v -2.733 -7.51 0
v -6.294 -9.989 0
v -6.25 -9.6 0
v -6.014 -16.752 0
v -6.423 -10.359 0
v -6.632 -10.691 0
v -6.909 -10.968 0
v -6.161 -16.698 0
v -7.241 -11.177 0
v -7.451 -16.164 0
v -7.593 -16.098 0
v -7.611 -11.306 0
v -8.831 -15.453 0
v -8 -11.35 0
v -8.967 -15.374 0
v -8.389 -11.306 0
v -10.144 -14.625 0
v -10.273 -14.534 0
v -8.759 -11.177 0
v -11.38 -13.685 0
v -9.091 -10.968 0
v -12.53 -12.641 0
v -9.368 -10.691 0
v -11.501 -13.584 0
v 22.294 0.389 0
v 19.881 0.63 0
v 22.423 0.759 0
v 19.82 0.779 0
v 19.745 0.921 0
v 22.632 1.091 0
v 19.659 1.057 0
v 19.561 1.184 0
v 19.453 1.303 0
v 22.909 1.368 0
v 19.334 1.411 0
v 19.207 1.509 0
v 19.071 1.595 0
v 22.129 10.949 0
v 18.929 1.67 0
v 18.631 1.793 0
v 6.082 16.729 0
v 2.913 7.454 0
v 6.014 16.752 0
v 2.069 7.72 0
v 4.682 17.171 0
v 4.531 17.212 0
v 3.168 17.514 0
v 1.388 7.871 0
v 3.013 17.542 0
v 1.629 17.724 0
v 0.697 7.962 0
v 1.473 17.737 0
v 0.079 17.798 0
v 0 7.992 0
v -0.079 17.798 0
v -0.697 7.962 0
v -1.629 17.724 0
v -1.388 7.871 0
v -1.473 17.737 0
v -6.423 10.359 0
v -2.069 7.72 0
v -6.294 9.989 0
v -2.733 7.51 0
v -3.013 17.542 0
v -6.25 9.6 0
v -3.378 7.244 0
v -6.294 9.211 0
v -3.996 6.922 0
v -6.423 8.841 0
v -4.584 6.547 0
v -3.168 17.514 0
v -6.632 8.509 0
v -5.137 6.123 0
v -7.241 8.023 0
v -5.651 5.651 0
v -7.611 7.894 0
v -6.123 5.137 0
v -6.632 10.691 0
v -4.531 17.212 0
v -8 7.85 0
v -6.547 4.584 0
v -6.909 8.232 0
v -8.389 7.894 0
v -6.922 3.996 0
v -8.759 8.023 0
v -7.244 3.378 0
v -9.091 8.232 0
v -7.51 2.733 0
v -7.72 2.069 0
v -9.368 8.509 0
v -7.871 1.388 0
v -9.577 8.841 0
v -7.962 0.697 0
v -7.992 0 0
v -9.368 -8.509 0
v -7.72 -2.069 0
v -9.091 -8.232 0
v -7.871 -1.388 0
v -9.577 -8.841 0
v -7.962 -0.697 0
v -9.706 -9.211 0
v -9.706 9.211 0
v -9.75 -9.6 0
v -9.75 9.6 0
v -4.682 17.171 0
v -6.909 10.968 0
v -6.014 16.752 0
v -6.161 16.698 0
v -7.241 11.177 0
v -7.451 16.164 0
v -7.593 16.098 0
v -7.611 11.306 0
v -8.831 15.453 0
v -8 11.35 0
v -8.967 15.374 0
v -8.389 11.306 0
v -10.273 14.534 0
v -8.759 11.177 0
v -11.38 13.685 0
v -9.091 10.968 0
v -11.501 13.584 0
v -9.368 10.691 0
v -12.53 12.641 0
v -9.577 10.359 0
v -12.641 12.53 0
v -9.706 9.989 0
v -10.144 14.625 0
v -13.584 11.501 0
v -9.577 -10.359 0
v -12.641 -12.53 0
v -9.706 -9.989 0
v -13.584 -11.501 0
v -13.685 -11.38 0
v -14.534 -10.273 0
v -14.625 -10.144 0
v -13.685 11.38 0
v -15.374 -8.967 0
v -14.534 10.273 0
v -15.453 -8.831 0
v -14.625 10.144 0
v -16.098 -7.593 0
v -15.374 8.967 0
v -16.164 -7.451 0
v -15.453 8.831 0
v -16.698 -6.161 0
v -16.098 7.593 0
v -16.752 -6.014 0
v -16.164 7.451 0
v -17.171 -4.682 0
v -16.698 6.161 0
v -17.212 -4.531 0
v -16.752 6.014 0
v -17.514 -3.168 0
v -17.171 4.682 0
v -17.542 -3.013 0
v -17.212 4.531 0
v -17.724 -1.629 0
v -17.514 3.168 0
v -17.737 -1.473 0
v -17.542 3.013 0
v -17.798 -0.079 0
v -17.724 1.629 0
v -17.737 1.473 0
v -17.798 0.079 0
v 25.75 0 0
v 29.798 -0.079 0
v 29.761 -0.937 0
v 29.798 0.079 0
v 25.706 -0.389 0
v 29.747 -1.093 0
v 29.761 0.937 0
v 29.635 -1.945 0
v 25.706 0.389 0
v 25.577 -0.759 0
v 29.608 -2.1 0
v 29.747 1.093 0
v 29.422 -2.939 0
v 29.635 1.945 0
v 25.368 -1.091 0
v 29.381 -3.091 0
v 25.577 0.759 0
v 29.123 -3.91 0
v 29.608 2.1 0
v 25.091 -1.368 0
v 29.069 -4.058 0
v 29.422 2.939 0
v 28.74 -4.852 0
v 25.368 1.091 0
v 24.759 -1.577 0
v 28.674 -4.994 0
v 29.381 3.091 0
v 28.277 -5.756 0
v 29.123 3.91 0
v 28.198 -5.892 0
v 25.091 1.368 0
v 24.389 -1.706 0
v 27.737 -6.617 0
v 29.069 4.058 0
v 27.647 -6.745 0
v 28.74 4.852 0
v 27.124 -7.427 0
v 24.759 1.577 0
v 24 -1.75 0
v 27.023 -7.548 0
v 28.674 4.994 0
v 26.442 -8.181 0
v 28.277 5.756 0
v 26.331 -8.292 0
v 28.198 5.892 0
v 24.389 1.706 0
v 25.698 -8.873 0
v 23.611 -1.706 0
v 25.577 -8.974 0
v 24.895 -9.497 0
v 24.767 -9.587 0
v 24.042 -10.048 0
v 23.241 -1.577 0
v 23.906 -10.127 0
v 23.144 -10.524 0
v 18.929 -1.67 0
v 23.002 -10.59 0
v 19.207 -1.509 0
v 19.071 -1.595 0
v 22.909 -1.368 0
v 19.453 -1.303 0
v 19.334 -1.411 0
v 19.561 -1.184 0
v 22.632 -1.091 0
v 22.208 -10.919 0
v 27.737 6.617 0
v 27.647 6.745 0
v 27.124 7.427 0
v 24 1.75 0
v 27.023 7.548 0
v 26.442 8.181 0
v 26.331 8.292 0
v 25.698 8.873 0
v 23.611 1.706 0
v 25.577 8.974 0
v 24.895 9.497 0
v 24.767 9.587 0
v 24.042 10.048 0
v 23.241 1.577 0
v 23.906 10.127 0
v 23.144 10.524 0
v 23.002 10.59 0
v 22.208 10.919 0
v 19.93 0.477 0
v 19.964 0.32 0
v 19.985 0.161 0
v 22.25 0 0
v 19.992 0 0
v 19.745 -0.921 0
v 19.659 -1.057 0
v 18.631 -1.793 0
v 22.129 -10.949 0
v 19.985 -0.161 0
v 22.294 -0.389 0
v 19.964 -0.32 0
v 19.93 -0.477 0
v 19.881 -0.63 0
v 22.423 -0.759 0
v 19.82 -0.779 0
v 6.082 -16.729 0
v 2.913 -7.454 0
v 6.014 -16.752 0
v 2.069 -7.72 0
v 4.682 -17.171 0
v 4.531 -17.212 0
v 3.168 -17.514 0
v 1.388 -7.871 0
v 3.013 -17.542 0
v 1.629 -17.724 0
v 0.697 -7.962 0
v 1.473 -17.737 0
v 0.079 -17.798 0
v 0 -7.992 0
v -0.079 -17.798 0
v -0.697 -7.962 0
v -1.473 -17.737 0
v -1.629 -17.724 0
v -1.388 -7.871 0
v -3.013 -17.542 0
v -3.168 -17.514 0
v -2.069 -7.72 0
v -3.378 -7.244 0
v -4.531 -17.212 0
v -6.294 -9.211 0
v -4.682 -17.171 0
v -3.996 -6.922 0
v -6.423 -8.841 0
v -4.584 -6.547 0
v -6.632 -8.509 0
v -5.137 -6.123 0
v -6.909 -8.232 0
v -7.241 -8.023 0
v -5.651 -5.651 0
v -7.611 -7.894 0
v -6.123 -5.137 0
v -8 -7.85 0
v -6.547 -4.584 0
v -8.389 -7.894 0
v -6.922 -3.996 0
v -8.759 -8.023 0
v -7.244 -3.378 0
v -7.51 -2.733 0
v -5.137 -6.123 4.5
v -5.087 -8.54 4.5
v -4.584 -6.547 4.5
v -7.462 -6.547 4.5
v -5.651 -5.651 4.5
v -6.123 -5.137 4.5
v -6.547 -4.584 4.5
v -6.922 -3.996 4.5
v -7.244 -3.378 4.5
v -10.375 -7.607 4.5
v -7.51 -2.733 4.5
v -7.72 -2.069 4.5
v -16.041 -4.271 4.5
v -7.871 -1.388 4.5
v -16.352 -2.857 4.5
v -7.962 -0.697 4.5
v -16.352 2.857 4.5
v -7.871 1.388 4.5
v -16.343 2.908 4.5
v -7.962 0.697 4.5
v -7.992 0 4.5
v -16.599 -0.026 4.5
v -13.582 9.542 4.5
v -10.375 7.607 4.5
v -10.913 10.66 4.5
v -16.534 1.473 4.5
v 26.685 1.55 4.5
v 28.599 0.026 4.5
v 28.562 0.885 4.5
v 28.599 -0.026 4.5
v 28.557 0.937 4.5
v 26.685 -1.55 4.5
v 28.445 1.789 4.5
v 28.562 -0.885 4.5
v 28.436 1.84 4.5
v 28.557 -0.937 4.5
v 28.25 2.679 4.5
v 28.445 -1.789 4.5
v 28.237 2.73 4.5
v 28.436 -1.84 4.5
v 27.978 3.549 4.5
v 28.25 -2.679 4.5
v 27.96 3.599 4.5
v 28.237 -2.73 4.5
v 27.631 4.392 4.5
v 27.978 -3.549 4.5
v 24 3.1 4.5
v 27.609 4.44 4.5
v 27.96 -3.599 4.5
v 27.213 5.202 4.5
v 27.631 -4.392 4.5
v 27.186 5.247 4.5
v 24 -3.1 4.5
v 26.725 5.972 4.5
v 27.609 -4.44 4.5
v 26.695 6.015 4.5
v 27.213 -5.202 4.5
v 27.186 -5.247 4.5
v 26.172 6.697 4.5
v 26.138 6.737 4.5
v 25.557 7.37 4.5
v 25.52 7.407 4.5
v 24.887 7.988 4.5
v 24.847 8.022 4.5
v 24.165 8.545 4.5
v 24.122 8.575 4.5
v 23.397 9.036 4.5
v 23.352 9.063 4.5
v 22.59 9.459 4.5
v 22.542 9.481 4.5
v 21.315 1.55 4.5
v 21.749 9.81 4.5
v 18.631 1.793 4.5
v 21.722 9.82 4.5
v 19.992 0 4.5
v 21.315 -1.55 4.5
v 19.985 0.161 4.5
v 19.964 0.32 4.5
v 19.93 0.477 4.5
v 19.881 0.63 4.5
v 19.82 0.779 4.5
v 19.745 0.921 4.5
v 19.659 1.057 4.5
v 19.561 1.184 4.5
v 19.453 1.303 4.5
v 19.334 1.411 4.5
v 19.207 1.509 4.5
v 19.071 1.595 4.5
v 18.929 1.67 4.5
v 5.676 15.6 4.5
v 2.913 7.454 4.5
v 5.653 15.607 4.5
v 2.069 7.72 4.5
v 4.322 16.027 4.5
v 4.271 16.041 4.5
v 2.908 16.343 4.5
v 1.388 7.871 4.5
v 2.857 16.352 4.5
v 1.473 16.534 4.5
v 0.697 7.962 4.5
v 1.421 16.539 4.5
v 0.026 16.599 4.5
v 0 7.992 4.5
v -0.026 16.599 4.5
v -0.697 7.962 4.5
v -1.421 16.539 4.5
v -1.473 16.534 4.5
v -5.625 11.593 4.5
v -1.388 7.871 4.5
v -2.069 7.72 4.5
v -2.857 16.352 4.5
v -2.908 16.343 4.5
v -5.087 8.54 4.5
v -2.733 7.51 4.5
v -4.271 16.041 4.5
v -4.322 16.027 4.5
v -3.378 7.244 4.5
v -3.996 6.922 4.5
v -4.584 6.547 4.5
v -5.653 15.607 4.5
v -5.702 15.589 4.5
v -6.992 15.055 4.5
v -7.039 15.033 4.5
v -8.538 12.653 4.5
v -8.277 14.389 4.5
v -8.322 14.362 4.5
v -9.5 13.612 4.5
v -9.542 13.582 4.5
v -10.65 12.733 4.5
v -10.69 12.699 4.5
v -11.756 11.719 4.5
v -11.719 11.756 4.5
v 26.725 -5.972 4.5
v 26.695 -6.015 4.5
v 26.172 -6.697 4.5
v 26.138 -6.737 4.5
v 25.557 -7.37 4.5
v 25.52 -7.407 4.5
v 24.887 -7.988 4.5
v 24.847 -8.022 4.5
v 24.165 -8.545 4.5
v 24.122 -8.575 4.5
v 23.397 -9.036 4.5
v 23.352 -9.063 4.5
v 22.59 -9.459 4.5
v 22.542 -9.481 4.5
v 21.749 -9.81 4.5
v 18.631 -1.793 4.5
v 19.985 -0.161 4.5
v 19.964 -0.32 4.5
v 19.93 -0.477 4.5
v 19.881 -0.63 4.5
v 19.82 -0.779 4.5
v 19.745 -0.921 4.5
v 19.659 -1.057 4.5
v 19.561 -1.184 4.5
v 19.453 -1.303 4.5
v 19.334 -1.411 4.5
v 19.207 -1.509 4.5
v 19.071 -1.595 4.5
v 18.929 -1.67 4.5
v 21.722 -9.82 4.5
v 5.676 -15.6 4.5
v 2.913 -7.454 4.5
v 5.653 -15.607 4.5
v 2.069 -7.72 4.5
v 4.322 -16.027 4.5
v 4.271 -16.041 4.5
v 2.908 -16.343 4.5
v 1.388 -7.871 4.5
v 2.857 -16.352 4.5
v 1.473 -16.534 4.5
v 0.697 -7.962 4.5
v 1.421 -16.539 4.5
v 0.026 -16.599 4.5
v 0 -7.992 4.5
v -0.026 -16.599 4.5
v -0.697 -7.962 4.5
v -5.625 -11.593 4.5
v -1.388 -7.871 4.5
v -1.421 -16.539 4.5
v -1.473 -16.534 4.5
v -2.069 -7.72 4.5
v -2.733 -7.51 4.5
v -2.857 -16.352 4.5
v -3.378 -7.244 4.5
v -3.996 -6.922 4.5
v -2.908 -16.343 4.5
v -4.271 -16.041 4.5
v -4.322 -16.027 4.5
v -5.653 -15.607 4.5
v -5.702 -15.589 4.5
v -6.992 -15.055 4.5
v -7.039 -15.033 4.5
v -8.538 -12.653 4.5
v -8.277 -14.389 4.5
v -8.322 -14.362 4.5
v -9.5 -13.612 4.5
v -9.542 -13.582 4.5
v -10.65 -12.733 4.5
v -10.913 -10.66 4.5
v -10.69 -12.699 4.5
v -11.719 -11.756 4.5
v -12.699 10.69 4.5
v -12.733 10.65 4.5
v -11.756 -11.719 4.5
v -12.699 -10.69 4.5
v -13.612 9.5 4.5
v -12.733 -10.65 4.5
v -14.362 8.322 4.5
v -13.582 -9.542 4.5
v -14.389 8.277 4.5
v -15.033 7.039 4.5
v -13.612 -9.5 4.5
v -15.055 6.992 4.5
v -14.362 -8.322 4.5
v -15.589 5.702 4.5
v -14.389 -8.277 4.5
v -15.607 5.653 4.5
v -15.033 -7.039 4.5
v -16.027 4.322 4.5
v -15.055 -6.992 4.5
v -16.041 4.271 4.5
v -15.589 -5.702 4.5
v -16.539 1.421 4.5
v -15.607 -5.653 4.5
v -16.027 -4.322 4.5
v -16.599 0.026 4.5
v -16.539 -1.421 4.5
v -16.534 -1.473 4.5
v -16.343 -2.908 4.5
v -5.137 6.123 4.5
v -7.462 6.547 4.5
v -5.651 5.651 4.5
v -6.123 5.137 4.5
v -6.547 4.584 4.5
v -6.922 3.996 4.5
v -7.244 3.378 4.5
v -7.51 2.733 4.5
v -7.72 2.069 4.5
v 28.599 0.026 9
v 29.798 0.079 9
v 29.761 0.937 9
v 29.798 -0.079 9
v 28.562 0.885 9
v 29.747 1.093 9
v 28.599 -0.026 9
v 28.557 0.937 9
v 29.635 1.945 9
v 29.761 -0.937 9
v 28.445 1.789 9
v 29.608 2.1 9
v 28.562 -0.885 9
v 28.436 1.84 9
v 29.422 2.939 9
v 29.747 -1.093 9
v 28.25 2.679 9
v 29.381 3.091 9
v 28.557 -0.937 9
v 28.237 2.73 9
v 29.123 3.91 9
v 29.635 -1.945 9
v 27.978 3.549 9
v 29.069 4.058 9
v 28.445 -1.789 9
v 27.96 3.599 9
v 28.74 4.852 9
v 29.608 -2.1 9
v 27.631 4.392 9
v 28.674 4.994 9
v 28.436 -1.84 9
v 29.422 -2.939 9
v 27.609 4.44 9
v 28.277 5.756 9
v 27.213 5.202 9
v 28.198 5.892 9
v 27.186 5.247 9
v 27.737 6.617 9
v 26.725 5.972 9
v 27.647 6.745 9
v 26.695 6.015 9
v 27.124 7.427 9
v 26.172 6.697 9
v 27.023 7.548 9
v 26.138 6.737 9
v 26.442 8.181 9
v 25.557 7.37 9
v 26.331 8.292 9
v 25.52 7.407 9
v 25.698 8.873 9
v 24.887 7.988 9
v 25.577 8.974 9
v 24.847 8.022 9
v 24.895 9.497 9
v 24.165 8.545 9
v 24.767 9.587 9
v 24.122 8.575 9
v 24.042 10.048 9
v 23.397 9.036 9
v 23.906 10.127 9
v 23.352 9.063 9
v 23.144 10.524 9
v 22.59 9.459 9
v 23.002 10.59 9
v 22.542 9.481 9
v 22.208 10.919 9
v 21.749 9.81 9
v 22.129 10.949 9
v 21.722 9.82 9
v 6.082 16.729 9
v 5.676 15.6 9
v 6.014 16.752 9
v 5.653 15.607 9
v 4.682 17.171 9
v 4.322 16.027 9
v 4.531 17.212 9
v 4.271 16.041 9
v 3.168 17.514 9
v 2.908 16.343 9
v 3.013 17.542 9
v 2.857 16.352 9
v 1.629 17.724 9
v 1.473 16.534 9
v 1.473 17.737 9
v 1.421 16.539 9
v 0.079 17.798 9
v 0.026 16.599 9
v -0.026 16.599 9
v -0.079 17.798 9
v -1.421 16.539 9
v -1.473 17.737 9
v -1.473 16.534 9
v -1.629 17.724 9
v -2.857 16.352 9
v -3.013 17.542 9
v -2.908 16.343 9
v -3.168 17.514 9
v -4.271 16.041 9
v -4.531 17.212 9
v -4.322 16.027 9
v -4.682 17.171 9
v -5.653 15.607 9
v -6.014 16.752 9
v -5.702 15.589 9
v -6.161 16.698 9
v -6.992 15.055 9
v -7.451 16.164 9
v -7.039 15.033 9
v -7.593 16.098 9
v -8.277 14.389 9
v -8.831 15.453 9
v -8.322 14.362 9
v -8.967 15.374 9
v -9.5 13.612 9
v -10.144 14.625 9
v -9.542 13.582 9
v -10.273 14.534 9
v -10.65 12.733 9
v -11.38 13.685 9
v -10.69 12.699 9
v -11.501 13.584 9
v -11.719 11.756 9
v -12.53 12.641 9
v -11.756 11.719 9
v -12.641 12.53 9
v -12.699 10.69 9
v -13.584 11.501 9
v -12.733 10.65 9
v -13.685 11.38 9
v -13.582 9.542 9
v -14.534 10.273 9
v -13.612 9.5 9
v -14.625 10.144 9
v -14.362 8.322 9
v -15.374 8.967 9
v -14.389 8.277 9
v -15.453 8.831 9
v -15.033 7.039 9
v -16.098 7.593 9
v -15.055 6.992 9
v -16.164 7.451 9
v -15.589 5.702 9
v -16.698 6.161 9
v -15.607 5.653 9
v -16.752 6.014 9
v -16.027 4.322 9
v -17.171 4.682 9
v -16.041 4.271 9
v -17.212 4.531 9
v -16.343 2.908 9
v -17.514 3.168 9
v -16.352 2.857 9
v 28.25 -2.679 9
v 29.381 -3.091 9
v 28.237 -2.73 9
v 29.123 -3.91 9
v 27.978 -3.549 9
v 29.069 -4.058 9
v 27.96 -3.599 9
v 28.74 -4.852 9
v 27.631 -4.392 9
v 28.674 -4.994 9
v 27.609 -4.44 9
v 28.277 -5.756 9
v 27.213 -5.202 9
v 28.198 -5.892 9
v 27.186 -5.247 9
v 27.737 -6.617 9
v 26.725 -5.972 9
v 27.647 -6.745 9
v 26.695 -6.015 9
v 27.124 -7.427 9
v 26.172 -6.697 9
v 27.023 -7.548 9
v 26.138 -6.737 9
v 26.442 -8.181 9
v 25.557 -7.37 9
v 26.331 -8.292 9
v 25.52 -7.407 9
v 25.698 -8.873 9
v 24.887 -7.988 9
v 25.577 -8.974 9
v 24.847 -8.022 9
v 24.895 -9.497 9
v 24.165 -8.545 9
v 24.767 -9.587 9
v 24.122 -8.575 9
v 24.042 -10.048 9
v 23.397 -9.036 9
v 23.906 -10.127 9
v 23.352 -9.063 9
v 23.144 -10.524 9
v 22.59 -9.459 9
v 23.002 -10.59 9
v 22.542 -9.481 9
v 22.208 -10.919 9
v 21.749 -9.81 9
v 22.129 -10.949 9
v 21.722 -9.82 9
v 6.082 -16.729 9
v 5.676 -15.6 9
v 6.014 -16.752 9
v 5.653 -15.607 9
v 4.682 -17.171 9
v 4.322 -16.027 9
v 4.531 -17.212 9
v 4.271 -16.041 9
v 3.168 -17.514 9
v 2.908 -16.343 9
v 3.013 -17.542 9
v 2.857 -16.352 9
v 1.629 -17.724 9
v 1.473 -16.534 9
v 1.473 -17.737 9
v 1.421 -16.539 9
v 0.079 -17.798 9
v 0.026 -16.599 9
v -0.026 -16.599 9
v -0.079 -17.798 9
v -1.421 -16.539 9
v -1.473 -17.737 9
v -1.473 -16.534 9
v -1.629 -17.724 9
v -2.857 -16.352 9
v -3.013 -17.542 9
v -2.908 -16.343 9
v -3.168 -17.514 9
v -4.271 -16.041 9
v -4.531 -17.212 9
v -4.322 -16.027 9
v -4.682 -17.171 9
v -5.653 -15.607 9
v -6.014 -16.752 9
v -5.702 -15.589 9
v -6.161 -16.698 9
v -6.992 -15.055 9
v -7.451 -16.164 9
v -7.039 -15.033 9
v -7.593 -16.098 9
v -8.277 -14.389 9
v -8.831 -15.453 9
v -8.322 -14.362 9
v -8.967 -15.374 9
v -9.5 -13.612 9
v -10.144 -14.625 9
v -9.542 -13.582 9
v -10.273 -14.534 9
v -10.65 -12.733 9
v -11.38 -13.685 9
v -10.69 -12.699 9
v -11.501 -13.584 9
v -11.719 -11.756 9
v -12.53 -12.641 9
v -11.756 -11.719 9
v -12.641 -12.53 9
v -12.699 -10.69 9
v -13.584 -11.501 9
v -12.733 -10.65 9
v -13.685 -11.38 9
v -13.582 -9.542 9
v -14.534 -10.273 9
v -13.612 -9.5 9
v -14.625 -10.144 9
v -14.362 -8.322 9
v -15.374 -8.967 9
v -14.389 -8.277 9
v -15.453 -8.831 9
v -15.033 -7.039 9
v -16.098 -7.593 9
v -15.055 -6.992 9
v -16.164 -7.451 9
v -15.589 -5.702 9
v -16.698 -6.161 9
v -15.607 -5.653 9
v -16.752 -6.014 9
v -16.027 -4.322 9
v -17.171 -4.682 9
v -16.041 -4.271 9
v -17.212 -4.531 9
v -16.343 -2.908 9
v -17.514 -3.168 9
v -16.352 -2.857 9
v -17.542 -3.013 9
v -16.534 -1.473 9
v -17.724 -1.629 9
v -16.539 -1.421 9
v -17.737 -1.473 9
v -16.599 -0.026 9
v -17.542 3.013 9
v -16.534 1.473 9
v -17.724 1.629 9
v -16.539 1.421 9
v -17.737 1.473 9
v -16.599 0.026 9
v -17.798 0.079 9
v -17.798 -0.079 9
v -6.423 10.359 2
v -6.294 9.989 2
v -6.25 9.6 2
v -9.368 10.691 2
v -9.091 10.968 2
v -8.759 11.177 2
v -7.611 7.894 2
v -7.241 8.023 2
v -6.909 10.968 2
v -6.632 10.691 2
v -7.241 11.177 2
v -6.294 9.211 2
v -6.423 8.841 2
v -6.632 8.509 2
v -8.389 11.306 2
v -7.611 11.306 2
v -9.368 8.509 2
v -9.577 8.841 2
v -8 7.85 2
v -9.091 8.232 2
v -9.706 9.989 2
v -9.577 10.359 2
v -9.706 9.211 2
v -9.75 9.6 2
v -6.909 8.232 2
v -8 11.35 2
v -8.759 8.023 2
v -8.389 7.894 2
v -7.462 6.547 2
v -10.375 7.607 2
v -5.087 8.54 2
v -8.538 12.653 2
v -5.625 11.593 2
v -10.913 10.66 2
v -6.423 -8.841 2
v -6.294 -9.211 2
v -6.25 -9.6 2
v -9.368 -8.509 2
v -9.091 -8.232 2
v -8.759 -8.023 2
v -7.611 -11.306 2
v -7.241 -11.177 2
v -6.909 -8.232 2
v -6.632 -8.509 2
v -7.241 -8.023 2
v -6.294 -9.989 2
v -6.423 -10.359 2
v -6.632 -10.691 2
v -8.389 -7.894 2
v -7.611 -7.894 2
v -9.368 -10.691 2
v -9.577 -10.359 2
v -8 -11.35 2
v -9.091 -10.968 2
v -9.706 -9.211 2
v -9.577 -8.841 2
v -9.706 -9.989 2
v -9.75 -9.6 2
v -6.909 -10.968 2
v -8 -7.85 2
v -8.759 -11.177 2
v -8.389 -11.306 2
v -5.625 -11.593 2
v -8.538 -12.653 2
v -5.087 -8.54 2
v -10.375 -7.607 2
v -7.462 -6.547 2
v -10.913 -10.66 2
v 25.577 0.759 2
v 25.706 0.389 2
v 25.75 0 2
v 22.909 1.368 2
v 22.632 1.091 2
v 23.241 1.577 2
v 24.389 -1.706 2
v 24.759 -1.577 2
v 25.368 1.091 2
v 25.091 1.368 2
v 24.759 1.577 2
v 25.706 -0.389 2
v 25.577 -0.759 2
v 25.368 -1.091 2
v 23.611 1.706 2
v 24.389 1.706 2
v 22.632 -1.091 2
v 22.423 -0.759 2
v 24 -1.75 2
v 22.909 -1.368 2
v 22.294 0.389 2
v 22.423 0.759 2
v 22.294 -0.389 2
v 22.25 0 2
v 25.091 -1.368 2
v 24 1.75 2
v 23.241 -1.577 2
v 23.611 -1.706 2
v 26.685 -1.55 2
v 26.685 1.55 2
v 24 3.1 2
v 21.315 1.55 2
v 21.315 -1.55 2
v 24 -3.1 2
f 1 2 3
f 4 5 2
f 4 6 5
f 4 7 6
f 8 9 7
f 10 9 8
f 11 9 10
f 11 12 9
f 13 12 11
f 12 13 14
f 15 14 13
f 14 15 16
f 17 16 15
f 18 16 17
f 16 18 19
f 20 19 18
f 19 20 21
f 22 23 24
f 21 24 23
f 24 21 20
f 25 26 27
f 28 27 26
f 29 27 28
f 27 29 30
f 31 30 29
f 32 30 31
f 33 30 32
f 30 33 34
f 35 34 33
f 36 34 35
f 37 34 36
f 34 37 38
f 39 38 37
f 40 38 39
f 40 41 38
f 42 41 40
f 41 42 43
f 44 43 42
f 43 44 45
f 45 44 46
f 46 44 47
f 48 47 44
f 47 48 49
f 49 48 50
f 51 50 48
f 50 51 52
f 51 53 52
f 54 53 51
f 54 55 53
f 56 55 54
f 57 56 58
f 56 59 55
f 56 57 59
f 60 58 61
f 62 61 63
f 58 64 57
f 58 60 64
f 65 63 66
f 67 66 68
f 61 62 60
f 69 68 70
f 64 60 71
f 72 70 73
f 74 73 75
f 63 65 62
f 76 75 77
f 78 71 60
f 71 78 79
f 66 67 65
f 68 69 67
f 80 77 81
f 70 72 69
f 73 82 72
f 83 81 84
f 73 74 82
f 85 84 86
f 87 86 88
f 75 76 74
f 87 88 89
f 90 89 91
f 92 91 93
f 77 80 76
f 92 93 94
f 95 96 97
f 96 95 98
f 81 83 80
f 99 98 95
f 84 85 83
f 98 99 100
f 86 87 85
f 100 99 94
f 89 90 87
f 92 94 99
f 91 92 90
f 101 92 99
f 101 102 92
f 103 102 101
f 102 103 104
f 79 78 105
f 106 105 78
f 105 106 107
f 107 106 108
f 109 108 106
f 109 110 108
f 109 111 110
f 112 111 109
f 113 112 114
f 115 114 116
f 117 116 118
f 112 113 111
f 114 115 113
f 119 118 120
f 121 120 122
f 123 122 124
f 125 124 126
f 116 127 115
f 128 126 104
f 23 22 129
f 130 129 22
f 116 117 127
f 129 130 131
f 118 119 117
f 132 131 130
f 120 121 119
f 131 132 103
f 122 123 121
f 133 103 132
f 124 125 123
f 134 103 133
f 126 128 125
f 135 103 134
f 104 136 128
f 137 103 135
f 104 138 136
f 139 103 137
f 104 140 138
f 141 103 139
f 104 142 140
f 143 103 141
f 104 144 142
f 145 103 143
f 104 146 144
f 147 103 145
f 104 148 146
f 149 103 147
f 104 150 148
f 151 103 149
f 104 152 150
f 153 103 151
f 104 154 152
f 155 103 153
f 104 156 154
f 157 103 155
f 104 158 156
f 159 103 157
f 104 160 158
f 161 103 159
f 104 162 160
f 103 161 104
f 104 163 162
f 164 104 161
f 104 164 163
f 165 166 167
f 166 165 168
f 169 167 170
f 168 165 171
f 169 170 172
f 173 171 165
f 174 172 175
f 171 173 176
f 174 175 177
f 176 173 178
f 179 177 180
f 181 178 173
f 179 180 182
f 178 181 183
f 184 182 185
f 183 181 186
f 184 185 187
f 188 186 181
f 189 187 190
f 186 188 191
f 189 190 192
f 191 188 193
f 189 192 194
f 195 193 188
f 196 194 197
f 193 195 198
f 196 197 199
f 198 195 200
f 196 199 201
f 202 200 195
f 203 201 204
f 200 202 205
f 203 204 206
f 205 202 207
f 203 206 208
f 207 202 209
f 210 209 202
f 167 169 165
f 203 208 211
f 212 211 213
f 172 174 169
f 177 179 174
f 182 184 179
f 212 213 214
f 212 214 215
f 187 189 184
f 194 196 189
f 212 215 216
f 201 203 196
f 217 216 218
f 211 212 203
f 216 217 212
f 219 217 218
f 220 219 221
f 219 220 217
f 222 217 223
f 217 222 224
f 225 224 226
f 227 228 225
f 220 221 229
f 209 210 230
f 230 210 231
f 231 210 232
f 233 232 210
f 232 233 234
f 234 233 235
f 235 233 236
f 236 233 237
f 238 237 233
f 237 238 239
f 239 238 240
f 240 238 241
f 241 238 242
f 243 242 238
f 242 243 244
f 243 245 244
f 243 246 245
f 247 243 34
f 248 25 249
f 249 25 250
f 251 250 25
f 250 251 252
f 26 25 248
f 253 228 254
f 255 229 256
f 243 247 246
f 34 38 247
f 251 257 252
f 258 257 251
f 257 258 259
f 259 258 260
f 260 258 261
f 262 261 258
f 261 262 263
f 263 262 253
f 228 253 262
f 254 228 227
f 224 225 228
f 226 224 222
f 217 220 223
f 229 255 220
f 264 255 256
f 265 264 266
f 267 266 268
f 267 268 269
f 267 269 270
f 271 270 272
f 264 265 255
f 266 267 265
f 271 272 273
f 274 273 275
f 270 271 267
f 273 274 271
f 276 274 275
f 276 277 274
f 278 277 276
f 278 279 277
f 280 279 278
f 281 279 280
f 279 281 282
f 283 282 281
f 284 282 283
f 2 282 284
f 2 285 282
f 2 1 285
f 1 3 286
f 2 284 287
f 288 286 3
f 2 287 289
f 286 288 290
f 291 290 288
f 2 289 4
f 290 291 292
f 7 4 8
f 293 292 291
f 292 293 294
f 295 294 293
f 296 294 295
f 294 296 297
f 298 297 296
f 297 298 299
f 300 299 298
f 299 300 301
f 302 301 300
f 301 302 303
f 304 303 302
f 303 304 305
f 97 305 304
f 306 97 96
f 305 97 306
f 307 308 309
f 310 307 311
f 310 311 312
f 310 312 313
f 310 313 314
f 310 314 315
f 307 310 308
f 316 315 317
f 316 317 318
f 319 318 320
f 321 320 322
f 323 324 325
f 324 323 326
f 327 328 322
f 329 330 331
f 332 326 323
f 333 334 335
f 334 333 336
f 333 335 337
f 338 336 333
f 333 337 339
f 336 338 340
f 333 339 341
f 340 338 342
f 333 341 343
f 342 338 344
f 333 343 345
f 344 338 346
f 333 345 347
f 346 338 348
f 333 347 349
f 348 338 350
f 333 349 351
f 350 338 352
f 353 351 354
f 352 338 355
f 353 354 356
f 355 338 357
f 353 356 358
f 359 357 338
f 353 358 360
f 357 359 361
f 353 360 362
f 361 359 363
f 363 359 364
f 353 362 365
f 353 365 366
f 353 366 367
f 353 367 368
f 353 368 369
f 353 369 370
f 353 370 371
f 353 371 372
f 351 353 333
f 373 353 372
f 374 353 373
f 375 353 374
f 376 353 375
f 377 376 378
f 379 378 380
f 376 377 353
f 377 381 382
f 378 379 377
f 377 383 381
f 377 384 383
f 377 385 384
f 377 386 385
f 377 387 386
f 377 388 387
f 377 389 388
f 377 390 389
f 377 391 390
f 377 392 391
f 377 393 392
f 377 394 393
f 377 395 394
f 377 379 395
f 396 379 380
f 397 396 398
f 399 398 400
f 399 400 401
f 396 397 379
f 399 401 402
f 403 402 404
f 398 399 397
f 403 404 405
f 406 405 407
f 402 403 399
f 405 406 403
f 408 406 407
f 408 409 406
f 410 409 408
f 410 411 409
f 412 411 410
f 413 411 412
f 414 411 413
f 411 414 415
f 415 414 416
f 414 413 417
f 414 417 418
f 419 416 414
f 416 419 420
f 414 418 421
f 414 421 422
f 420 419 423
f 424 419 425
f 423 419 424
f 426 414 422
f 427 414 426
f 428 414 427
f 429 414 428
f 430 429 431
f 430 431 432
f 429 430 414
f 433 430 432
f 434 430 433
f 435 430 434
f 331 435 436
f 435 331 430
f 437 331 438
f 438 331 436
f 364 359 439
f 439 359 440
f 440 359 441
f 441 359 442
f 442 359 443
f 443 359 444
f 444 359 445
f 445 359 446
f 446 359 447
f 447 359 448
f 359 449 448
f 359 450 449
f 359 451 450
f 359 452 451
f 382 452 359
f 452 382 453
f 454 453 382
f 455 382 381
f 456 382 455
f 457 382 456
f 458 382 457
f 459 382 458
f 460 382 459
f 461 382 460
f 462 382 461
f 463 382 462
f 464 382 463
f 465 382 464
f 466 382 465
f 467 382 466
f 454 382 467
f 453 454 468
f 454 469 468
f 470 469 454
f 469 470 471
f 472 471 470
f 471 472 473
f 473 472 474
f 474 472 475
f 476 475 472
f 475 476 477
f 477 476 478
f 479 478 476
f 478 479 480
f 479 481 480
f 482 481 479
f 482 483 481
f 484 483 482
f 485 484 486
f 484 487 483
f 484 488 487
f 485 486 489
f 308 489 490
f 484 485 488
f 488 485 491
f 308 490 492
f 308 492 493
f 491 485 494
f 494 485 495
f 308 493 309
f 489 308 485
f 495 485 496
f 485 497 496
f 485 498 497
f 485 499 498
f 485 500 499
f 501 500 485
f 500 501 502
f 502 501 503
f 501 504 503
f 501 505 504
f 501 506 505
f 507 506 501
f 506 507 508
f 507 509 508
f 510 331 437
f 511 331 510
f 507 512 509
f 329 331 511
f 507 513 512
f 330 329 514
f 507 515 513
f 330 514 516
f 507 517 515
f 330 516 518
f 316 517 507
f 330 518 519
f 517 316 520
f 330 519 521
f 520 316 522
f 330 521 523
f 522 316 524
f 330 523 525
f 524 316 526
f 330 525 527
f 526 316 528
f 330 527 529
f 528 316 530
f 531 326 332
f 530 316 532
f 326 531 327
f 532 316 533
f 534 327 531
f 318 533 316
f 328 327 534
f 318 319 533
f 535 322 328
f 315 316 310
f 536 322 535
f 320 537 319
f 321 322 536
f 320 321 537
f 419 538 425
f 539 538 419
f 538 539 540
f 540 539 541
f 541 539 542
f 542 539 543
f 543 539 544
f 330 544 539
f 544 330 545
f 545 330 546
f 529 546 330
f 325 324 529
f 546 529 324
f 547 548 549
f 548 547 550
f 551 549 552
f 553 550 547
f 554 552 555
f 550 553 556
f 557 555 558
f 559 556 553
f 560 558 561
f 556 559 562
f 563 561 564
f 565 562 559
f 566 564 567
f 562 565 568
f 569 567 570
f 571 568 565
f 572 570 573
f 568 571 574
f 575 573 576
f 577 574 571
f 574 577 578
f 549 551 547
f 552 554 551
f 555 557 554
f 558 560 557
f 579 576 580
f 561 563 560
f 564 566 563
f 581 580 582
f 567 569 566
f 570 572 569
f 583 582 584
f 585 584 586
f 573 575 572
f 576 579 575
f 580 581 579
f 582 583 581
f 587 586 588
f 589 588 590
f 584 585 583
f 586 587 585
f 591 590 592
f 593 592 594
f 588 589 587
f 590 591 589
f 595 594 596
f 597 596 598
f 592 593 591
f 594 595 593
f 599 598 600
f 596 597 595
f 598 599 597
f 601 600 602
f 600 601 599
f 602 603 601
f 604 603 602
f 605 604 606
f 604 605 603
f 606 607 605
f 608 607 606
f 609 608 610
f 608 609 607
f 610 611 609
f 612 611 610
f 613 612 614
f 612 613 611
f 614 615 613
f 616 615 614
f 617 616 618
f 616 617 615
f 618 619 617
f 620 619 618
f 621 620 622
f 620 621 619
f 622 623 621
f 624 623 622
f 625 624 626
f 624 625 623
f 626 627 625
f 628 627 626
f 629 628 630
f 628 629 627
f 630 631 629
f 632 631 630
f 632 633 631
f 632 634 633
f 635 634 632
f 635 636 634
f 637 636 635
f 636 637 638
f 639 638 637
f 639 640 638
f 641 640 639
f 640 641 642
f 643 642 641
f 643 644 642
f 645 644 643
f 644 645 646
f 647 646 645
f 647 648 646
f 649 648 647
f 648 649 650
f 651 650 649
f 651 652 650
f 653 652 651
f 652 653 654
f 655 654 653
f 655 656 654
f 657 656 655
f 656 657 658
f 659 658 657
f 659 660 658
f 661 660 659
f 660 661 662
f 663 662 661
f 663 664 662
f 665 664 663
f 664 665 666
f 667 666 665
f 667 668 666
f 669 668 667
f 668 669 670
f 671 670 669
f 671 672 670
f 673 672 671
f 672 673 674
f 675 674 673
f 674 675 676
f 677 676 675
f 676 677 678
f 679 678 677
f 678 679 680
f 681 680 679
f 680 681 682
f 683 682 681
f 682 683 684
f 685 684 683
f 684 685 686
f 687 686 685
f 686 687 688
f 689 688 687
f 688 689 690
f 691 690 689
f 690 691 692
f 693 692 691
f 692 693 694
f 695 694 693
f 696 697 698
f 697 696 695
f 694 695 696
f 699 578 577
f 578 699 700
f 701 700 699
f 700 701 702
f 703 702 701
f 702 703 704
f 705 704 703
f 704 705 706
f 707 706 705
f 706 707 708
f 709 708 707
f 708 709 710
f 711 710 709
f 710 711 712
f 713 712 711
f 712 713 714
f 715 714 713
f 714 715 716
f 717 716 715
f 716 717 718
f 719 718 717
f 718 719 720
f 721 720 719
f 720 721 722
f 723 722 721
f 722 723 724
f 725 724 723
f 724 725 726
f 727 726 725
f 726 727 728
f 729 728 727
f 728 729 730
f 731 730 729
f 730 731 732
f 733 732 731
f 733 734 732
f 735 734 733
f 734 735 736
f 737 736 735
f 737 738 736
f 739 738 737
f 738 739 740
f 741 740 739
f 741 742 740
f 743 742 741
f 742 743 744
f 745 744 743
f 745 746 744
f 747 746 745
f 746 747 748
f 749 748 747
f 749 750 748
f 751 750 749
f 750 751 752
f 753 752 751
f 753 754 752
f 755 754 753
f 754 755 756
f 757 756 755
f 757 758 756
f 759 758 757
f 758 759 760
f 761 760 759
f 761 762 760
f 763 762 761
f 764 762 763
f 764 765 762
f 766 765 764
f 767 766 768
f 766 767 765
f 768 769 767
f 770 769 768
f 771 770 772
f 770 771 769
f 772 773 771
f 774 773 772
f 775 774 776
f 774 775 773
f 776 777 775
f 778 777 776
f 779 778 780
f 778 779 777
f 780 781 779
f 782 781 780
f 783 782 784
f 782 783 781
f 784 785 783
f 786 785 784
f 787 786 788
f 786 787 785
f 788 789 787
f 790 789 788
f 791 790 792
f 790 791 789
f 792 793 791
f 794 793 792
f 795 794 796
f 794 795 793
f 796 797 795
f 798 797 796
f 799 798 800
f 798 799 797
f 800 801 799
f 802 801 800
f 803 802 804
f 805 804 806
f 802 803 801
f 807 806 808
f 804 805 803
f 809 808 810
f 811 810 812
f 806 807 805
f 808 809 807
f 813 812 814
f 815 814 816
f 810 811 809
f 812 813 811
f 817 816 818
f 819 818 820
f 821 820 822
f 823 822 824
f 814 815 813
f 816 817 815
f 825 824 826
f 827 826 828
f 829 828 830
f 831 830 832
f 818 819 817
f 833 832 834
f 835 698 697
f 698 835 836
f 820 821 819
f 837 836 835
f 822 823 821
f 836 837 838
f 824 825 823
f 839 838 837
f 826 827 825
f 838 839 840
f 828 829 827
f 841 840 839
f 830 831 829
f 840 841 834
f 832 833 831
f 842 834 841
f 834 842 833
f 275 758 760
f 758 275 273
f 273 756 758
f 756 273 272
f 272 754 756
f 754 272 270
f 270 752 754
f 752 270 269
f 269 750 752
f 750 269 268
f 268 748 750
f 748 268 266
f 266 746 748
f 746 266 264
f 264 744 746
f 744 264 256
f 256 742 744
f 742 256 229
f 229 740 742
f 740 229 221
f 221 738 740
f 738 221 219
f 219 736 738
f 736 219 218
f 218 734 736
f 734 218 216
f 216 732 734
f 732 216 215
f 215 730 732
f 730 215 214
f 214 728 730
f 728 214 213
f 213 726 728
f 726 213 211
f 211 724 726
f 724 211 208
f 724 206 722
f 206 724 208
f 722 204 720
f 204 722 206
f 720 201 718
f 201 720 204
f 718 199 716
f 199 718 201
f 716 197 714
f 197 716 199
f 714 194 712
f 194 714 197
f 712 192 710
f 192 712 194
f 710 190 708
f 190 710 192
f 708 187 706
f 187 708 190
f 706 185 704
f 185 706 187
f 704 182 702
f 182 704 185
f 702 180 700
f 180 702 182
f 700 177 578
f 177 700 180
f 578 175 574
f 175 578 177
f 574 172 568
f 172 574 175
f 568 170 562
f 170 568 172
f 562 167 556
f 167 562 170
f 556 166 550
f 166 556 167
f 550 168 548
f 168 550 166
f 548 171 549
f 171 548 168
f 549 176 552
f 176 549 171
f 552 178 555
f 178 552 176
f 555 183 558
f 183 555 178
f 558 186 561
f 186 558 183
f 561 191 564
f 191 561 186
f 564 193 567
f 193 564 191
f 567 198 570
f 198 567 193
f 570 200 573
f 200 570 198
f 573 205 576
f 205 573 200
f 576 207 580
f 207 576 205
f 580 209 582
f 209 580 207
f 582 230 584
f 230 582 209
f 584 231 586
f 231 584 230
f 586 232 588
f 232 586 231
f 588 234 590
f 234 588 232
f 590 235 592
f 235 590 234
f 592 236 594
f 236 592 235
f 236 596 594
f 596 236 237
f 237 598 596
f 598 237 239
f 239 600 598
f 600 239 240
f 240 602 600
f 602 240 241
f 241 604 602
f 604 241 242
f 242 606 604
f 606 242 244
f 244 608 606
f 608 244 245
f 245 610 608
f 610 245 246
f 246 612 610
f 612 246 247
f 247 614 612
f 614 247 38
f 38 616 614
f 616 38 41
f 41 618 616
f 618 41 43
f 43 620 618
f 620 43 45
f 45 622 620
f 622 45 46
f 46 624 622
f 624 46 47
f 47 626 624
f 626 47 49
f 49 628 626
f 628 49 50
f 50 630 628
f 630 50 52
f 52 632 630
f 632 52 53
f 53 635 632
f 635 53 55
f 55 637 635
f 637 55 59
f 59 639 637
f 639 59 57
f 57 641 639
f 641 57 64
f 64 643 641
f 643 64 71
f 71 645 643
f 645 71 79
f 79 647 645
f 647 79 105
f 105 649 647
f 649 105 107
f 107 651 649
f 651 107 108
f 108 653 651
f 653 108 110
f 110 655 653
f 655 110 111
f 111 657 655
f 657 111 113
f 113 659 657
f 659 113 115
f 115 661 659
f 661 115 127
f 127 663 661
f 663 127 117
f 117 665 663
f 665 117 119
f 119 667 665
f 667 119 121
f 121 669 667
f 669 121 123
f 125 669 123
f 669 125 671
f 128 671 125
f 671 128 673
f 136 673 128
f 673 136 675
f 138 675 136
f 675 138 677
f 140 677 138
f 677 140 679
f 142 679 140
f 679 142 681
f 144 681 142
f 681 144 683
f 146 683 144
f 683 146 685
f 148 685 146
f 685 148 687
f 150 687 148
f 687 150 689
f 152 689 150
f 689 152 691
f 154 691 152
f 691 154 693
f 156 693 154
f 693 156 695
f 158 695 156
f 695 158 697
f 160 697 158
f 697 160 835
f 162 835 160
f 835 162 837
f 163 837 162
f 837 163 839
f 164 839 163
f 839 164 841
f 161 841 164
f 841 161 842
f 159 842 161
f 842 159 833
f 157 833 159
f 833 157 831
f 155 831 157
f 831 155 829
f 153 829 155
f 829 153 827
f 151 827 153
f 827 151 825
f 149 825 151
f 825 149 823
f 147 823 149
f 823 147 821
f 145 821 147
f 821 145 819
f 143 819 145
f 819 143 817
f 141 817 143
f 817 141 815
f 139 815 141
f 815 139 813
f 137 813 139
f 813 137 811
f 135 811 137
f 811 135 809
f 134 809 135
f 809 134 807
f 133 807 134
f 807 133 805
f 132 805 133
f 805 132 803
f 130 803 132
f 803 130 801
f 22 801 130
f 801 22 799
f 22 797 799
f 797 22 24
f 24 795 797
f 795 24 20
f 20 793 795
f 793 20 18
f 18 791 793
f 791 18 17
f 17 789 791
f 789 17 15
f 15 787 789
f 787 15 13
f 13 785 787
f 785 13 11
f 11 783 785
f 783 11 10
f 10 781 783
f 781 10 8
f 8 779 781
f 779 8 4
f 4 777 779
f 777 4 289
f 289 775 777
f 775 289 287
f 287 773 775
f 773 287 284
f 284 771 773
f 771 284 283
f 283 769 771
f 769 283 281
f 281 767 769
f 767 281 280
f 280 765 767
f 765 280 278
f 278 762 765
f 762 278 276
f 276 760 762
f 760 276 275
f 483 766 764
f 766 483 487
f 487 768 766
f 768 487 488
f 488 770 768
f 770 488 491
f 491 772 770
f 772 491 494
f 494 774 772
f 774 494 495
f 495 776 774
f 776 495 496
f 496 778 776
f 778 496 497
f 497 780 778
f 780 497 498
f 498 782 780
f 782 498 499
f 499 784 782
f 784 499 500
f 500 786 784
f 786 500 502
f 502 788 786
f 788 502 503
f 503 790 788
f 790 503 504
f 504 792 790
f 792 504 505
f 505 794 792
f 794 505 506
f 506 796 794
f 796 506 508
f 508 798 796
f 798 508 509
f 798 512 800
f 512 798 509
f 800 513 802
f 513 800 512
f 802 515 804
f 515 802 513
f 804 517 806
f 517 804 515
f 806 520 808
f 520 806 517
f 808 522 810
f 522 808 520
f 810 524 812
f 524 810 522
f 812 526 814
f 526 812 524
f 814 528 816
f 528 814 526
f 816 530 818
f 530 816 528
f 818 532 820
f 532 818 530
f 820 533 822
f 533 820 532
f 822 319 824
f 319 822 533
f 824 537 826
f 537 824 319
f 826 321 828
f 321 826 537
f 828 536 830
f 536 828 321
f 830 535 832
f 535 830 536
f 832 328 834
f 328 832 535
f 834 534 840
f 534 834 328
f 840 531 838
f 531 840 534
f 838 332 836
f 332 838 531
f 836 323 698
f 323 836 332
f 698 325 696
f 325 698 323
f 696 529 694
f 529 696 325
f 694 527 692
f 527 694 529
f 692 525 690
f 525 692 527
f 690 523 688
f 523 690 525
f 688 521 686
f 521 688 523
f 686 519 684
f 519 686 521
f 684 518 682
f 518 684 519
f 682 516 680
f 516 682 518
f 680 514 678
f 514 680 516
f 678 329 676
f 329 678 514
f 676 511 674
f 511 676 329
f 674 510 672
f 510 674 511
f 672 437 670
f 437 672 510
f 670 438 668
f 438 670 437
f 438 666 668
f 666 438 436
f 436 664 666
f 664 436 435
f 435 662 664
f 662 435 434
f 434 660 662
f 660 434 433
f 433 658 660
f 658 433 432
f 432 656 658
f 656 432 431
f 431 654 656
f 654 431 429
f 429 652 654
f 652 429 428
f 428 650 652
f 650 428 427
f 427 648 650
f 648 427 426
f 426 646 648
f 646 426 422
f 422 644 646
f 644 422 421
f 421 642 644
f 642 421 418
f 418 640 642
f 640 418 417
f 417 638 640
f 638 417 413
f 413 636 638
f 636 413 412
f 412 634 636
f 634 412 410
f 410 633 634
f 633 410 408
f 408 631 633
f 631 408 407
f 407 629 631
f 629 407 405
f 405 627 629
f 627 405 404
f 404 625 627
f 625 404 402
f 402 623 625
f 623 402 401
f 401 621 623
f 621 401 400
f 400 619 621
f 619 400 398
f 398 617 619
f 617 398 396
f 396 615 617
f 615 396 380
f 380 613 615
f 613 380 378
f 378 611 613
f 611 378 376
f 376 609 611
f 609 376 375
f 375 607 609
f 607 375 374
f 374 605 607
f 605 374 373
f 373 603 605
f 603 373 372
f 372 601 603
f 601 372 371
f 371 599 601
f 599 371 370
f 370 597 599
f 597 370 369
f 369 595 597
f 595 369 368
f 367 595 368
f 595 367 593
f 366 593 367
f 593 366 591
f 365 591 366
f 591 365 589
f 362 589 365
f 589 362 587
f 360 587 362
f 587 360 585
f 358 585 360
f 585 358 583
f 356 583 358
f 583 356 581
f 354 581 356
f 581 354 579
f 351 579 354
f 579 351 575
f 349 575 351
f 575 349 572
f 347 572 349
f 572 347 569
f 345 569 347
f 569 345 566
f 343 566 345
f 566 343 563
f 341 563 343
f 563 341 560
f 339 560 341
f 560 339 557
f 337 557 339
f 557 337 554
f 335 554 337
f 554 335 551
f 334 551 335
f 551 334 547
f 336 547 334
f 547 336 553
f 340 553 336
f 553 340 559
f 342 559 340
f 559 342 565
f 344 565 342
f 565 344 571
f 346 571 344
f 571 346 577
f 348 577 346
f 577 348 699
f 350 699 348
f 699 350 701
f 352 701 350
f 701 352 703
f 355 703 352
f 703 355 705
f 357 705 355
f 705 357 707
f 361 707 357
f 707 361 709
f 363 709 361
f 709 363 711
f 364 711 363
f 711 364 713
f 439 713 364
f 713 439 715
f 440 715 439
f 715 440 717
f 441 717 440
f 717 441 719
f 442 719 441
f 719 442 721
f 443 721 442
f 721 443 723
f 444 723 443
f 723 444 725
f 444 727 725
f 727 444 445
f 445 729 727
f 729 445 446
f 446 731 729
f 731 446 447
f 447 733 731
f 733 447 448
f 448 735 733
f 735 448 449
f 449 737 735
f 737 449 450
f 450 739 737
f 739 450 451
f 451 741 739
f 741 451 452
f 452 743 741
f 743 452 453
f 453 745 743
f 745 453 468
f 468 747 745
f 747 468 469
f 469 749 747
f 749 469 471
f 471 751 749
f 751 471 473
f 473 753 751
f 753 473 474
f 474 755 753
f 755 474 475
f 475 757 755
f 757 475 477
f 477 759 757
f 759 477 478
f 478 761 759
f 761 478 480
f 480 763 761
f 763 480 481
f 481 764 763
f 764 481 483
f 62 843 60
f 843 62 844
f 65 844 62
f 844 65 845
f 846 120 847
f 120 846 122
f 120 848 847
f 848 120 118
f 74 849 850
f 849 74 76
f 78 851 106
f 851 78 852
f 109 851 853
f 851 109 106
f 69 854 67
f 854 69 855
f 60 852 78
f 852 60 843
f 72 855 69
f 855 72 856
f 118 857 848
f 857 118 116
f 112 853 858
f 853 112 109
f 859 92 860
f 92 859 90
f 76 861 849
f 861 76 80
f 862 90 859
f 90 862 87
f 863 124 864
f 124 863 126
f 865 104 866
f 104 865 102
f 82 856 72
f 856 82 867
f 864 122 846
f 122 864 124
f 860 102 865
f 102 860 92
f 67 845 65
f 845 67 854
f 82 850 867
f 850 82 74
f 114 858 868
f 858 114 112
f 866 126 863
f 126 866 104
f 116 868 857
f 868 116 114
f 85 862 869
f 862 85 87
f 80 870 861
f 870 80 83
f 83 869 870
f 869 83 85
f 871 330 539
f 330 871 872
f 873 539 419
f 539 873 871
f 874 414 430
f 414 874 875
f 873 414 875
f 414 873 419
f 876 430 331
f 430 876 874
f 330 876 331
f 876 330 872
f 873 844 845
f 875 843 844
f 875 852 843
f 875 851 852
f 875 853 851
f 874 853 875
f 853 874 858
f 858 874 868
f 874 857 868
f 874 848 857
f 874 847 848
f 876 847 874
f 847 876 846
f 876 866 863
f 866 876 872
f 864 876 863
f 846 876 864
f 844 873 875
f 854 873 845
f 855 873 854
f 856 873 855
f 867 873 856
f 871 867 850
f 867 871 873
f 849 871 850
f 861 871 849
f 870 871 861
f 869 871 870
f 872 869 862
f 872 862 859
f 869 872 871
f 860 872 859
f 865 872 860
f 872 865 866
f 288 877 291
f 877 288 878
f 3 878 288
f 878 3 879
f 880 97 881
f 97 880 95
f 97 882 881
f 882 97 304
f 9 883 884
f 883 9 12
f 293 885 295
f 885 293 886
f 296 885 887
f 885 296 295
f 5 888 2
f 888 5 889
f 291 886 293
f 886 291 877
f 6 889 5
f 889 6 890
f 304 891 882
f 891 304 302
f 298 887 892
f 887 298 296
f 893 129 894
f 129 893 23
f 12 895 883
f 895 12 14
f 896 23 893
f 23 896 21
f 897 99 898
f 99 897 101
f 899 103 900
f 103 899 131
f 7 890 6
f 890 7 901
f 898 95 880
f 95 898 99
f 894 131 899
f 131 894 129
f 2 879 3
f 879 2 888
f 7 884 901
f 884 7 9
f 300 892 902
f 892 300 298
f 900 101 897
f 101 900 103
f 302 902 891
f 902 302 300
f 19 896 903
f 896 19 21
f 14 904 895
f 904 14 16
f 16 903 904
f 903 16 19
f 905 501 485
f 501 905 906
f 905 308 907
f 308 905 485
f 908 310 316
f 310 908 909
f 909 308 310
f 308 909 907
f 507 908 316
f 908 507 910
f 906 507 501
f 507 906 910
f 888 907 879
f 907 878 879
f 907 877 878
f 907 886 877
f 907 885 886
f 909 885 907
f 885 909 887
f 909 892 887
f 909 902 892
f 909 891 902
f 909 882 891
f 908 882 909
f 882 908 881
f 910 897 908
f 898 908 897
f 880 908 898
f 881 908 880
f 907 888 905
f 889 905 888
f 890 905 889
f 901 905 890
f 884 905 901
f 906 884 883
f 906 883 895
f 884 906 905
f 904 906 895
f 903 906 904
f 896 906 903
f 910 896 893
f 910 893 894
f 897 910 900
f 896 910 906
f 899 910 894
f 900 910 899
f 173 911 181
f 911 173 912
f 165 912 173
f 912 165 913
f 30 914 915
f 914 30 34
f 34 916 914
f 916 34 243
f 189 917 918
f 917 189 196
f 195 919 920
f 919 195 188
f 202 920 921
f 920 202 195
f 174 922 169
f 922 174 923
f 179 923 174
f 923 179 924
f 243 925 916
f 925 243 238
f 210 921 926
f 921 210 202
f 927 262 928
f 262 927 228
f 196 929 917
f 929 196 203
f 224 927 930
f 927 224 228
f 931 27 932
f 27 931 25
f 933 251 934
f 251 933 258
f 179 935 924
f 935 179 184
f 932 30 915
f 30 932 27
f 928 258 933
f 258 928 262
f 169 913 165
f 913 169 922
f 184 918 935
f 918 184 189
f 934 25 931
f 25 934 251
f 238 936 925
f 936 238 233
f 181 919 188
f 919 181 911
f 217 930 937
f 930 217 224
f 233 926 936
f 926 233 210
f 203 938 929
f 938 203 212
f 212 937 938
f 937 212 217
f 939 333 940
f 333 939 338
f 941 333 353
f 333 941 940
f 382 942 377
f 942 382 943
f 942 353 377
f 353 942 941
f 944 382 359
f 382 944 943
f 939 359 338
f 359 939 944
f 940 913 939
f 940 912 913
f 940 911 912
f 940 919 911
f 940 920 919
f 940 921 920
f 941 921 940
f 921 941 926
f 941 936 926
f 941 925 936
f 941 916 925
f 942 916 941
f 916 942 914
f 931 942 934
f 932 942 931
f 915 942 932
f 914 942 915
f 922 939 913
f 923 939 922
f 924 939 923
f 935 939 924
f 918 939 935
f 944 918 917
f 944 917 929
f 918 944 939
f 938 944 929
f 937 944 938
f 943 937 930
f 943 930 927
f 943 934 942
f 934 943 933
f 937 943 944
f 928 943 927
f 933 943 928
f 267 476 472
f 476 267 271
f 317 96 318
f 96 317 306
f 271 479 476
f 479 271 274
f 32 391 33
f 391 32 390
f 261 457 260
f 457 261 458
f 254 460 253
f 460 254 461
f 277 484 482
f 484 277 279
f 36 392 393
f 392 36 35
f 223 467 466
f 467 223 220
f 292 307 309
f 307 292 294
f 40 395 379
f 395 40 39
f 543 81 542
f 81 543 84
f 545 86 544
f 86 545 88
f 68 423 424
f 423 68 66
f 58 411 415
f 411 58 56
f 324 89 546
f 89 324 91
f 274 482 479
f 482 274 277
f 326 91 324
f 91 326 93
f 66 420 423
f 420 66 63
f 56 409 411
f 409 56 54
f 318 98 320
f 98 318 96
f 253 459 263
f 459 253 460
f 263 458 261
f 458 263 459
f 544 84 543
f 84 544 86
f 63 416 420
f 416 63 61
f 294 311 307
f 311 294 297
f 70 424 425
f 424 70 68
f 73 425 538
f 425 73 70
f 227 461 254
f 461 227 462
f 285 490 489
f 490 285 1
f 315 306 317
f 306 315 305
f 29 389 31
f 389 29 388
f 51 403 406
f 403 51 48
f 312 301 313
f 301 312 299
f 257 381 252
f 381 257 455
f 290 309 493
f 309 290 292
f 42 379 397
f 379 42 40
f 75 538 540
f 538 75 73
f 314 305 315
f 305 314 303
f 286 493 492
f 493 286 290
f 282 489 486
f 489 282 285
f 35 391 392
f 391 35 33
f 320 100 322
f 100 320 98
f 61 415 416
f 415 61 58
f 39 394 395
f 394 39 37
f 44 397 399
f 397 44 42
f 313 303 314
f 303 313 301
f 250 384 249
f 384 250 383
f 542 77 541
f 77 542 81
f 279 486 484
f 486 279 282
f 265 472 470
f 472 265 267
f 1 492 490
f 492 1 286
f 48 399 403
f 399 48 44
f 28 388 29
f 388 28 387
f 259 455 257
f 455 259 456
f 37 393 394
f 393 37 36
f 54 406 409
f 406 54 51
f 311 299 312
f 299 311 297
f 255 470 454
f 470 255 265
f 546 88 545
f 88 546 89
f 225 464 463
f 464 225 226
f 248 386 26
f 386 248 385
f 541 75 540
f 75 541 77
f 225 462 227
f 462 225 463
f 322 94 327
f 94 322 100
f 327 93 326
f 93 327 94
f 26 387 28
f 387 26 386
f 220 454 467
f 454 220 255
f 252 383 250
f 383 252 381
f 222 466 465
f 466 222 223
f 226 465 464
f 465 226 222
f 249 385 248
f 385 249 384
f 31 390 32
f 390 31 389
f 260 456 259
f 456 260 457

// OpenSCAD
//$fn=60;
$fa=5;
$fs=.4;

difference(){
    union(){
        linear_extrude(height=4.5) offset(r=1.5) fuselage_shape();
        linear_extrude(height=9) difference(){
            offset(r=1.8) fuselage_shape();
            offset(r=0.6) fuselage_shape();
        }
    }
    translate([0,0,-1]) linear_extrude(height=10) offset(r=-8) fuselage_shape();
    mounting_holes();
}

module mounting_holes(){
    translate([-8,9.6,0]) {
        translate([0,0,-1]) cylinder(h=10,d=3.5);
        translate([0,0,2]) rotate([0,0,-20]) cylinder(h=10,d=6.2,$fn=6);
    }
    translate([-8,-9.6,0]){
        translate([0,0,-1]) cylinder(h=10,d=3.5);
        translate([0,0,2]) rotate([0,0,20]) cylinder(h=10,d=6.2,$fn=6);
    }
    translate([28-4,0,0]){
        translate([0,0,-1]) cylinder(h=10,d=3.5);
        translate([0,0,2]) rotate([0,0,90]) cylinder(h=10,d=6.2,$fn=6);
    }
}

module fuselage_shape(){
    hull(){
        circle(d=32,center=true);
        translate([28-19.7/2,0,0]) circle(d=19.7,center=true);
    }
}
